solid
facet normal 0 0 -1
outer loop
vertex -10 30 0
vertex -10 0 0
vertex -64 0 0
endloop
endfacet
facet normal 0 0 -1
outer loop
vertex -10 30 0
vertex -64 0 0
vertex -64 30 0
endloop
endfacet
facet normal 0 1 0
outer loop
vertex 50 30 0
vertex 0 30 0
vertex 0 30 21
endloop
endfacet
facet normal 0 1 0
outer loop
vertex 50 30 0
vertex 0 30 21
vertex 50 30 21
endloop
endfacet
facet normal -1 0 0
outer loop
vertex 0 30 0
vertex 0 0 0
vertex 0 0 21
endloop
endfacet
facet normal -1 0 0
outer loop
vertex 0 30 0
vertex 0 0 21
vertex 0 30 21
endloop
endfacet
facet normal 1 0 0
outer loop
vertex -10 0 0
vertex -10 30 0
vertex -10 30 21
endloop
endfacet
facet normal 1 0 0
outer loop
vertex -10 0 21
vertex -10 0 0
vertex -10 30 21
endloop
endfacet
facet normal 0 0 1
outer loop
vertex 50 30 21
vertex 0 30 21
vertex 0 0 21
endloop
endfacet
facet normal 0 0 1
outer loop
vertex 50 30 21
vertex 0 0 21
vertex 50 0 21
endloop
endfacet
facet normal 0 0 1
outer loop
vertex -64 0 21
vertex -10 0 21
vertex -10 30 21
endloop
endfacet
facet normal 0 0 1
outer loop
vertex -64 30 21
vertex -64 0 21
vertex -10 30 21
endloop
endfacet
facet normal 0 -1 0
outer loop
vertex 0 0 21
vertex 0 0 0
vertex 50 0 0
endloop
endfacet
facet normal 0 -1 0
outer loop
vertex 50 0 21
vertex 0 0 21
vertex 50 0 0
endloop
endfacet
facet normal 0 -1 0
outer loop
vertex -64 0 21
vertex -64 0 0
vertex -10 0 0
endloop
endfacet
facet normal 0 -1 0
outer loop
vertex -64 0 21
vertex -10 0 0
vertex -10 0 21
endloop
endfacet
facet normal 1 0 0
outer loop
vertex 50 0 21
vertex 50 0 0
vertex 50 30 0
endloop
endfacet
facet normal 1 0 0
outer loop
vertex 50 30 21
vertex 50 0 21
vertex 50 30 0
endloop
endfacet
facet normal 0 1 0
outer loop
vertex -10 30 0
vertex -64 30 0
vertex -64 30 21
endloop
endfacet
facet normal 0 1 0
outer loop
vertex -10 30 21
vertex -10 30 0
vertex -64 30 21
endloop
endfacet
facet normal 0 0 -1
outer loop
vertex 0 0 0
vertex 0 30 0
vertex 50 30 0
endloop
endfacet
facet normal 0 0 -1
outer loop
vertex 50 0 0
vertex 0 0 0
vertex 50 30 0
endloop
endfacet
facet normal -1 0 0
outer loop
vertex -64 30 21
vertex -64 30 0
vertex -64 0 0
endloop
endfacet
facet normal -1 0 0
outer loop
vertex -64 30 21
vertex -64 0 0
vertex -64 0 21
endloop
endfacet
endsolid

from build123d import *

# Parameters (mm, degrees)
ESQUISSE1_W        = 50
ESQUISSE1_H        = 30
BOSS_EXTRU_1_DEPTH = 21
ESQUISSE3_W        = 21
ESQUISSE3_H        = 30
BOSS_EXTRU_3_DEPTH = 54


with BuildPart() as part:
    # Esquisse1 → Boss.-Extru.1 (new body)
    with BuildSketch(Plane.XY):
        with Locations((25, 15)):
            Rectangle(ESQUISSE1_W, ESQUISSE1_H)
    extrude(amount=BOSS_EXTRU_1_DEPTH)


with BuildPart() as body_2:
    # Esquisse3 → Boss.-Extru.3 (new body)
    with BuildSketch(Plane.ZY.offset(10)):
        with Locations((10.5, 15)):
            Rectangle(ESQUISSE3_W, ESQUISSE3_H)
    extrude(amount=BOSS_EXTRU_3_DEPTH)


solid = Compound([part.part, body_2.part])
